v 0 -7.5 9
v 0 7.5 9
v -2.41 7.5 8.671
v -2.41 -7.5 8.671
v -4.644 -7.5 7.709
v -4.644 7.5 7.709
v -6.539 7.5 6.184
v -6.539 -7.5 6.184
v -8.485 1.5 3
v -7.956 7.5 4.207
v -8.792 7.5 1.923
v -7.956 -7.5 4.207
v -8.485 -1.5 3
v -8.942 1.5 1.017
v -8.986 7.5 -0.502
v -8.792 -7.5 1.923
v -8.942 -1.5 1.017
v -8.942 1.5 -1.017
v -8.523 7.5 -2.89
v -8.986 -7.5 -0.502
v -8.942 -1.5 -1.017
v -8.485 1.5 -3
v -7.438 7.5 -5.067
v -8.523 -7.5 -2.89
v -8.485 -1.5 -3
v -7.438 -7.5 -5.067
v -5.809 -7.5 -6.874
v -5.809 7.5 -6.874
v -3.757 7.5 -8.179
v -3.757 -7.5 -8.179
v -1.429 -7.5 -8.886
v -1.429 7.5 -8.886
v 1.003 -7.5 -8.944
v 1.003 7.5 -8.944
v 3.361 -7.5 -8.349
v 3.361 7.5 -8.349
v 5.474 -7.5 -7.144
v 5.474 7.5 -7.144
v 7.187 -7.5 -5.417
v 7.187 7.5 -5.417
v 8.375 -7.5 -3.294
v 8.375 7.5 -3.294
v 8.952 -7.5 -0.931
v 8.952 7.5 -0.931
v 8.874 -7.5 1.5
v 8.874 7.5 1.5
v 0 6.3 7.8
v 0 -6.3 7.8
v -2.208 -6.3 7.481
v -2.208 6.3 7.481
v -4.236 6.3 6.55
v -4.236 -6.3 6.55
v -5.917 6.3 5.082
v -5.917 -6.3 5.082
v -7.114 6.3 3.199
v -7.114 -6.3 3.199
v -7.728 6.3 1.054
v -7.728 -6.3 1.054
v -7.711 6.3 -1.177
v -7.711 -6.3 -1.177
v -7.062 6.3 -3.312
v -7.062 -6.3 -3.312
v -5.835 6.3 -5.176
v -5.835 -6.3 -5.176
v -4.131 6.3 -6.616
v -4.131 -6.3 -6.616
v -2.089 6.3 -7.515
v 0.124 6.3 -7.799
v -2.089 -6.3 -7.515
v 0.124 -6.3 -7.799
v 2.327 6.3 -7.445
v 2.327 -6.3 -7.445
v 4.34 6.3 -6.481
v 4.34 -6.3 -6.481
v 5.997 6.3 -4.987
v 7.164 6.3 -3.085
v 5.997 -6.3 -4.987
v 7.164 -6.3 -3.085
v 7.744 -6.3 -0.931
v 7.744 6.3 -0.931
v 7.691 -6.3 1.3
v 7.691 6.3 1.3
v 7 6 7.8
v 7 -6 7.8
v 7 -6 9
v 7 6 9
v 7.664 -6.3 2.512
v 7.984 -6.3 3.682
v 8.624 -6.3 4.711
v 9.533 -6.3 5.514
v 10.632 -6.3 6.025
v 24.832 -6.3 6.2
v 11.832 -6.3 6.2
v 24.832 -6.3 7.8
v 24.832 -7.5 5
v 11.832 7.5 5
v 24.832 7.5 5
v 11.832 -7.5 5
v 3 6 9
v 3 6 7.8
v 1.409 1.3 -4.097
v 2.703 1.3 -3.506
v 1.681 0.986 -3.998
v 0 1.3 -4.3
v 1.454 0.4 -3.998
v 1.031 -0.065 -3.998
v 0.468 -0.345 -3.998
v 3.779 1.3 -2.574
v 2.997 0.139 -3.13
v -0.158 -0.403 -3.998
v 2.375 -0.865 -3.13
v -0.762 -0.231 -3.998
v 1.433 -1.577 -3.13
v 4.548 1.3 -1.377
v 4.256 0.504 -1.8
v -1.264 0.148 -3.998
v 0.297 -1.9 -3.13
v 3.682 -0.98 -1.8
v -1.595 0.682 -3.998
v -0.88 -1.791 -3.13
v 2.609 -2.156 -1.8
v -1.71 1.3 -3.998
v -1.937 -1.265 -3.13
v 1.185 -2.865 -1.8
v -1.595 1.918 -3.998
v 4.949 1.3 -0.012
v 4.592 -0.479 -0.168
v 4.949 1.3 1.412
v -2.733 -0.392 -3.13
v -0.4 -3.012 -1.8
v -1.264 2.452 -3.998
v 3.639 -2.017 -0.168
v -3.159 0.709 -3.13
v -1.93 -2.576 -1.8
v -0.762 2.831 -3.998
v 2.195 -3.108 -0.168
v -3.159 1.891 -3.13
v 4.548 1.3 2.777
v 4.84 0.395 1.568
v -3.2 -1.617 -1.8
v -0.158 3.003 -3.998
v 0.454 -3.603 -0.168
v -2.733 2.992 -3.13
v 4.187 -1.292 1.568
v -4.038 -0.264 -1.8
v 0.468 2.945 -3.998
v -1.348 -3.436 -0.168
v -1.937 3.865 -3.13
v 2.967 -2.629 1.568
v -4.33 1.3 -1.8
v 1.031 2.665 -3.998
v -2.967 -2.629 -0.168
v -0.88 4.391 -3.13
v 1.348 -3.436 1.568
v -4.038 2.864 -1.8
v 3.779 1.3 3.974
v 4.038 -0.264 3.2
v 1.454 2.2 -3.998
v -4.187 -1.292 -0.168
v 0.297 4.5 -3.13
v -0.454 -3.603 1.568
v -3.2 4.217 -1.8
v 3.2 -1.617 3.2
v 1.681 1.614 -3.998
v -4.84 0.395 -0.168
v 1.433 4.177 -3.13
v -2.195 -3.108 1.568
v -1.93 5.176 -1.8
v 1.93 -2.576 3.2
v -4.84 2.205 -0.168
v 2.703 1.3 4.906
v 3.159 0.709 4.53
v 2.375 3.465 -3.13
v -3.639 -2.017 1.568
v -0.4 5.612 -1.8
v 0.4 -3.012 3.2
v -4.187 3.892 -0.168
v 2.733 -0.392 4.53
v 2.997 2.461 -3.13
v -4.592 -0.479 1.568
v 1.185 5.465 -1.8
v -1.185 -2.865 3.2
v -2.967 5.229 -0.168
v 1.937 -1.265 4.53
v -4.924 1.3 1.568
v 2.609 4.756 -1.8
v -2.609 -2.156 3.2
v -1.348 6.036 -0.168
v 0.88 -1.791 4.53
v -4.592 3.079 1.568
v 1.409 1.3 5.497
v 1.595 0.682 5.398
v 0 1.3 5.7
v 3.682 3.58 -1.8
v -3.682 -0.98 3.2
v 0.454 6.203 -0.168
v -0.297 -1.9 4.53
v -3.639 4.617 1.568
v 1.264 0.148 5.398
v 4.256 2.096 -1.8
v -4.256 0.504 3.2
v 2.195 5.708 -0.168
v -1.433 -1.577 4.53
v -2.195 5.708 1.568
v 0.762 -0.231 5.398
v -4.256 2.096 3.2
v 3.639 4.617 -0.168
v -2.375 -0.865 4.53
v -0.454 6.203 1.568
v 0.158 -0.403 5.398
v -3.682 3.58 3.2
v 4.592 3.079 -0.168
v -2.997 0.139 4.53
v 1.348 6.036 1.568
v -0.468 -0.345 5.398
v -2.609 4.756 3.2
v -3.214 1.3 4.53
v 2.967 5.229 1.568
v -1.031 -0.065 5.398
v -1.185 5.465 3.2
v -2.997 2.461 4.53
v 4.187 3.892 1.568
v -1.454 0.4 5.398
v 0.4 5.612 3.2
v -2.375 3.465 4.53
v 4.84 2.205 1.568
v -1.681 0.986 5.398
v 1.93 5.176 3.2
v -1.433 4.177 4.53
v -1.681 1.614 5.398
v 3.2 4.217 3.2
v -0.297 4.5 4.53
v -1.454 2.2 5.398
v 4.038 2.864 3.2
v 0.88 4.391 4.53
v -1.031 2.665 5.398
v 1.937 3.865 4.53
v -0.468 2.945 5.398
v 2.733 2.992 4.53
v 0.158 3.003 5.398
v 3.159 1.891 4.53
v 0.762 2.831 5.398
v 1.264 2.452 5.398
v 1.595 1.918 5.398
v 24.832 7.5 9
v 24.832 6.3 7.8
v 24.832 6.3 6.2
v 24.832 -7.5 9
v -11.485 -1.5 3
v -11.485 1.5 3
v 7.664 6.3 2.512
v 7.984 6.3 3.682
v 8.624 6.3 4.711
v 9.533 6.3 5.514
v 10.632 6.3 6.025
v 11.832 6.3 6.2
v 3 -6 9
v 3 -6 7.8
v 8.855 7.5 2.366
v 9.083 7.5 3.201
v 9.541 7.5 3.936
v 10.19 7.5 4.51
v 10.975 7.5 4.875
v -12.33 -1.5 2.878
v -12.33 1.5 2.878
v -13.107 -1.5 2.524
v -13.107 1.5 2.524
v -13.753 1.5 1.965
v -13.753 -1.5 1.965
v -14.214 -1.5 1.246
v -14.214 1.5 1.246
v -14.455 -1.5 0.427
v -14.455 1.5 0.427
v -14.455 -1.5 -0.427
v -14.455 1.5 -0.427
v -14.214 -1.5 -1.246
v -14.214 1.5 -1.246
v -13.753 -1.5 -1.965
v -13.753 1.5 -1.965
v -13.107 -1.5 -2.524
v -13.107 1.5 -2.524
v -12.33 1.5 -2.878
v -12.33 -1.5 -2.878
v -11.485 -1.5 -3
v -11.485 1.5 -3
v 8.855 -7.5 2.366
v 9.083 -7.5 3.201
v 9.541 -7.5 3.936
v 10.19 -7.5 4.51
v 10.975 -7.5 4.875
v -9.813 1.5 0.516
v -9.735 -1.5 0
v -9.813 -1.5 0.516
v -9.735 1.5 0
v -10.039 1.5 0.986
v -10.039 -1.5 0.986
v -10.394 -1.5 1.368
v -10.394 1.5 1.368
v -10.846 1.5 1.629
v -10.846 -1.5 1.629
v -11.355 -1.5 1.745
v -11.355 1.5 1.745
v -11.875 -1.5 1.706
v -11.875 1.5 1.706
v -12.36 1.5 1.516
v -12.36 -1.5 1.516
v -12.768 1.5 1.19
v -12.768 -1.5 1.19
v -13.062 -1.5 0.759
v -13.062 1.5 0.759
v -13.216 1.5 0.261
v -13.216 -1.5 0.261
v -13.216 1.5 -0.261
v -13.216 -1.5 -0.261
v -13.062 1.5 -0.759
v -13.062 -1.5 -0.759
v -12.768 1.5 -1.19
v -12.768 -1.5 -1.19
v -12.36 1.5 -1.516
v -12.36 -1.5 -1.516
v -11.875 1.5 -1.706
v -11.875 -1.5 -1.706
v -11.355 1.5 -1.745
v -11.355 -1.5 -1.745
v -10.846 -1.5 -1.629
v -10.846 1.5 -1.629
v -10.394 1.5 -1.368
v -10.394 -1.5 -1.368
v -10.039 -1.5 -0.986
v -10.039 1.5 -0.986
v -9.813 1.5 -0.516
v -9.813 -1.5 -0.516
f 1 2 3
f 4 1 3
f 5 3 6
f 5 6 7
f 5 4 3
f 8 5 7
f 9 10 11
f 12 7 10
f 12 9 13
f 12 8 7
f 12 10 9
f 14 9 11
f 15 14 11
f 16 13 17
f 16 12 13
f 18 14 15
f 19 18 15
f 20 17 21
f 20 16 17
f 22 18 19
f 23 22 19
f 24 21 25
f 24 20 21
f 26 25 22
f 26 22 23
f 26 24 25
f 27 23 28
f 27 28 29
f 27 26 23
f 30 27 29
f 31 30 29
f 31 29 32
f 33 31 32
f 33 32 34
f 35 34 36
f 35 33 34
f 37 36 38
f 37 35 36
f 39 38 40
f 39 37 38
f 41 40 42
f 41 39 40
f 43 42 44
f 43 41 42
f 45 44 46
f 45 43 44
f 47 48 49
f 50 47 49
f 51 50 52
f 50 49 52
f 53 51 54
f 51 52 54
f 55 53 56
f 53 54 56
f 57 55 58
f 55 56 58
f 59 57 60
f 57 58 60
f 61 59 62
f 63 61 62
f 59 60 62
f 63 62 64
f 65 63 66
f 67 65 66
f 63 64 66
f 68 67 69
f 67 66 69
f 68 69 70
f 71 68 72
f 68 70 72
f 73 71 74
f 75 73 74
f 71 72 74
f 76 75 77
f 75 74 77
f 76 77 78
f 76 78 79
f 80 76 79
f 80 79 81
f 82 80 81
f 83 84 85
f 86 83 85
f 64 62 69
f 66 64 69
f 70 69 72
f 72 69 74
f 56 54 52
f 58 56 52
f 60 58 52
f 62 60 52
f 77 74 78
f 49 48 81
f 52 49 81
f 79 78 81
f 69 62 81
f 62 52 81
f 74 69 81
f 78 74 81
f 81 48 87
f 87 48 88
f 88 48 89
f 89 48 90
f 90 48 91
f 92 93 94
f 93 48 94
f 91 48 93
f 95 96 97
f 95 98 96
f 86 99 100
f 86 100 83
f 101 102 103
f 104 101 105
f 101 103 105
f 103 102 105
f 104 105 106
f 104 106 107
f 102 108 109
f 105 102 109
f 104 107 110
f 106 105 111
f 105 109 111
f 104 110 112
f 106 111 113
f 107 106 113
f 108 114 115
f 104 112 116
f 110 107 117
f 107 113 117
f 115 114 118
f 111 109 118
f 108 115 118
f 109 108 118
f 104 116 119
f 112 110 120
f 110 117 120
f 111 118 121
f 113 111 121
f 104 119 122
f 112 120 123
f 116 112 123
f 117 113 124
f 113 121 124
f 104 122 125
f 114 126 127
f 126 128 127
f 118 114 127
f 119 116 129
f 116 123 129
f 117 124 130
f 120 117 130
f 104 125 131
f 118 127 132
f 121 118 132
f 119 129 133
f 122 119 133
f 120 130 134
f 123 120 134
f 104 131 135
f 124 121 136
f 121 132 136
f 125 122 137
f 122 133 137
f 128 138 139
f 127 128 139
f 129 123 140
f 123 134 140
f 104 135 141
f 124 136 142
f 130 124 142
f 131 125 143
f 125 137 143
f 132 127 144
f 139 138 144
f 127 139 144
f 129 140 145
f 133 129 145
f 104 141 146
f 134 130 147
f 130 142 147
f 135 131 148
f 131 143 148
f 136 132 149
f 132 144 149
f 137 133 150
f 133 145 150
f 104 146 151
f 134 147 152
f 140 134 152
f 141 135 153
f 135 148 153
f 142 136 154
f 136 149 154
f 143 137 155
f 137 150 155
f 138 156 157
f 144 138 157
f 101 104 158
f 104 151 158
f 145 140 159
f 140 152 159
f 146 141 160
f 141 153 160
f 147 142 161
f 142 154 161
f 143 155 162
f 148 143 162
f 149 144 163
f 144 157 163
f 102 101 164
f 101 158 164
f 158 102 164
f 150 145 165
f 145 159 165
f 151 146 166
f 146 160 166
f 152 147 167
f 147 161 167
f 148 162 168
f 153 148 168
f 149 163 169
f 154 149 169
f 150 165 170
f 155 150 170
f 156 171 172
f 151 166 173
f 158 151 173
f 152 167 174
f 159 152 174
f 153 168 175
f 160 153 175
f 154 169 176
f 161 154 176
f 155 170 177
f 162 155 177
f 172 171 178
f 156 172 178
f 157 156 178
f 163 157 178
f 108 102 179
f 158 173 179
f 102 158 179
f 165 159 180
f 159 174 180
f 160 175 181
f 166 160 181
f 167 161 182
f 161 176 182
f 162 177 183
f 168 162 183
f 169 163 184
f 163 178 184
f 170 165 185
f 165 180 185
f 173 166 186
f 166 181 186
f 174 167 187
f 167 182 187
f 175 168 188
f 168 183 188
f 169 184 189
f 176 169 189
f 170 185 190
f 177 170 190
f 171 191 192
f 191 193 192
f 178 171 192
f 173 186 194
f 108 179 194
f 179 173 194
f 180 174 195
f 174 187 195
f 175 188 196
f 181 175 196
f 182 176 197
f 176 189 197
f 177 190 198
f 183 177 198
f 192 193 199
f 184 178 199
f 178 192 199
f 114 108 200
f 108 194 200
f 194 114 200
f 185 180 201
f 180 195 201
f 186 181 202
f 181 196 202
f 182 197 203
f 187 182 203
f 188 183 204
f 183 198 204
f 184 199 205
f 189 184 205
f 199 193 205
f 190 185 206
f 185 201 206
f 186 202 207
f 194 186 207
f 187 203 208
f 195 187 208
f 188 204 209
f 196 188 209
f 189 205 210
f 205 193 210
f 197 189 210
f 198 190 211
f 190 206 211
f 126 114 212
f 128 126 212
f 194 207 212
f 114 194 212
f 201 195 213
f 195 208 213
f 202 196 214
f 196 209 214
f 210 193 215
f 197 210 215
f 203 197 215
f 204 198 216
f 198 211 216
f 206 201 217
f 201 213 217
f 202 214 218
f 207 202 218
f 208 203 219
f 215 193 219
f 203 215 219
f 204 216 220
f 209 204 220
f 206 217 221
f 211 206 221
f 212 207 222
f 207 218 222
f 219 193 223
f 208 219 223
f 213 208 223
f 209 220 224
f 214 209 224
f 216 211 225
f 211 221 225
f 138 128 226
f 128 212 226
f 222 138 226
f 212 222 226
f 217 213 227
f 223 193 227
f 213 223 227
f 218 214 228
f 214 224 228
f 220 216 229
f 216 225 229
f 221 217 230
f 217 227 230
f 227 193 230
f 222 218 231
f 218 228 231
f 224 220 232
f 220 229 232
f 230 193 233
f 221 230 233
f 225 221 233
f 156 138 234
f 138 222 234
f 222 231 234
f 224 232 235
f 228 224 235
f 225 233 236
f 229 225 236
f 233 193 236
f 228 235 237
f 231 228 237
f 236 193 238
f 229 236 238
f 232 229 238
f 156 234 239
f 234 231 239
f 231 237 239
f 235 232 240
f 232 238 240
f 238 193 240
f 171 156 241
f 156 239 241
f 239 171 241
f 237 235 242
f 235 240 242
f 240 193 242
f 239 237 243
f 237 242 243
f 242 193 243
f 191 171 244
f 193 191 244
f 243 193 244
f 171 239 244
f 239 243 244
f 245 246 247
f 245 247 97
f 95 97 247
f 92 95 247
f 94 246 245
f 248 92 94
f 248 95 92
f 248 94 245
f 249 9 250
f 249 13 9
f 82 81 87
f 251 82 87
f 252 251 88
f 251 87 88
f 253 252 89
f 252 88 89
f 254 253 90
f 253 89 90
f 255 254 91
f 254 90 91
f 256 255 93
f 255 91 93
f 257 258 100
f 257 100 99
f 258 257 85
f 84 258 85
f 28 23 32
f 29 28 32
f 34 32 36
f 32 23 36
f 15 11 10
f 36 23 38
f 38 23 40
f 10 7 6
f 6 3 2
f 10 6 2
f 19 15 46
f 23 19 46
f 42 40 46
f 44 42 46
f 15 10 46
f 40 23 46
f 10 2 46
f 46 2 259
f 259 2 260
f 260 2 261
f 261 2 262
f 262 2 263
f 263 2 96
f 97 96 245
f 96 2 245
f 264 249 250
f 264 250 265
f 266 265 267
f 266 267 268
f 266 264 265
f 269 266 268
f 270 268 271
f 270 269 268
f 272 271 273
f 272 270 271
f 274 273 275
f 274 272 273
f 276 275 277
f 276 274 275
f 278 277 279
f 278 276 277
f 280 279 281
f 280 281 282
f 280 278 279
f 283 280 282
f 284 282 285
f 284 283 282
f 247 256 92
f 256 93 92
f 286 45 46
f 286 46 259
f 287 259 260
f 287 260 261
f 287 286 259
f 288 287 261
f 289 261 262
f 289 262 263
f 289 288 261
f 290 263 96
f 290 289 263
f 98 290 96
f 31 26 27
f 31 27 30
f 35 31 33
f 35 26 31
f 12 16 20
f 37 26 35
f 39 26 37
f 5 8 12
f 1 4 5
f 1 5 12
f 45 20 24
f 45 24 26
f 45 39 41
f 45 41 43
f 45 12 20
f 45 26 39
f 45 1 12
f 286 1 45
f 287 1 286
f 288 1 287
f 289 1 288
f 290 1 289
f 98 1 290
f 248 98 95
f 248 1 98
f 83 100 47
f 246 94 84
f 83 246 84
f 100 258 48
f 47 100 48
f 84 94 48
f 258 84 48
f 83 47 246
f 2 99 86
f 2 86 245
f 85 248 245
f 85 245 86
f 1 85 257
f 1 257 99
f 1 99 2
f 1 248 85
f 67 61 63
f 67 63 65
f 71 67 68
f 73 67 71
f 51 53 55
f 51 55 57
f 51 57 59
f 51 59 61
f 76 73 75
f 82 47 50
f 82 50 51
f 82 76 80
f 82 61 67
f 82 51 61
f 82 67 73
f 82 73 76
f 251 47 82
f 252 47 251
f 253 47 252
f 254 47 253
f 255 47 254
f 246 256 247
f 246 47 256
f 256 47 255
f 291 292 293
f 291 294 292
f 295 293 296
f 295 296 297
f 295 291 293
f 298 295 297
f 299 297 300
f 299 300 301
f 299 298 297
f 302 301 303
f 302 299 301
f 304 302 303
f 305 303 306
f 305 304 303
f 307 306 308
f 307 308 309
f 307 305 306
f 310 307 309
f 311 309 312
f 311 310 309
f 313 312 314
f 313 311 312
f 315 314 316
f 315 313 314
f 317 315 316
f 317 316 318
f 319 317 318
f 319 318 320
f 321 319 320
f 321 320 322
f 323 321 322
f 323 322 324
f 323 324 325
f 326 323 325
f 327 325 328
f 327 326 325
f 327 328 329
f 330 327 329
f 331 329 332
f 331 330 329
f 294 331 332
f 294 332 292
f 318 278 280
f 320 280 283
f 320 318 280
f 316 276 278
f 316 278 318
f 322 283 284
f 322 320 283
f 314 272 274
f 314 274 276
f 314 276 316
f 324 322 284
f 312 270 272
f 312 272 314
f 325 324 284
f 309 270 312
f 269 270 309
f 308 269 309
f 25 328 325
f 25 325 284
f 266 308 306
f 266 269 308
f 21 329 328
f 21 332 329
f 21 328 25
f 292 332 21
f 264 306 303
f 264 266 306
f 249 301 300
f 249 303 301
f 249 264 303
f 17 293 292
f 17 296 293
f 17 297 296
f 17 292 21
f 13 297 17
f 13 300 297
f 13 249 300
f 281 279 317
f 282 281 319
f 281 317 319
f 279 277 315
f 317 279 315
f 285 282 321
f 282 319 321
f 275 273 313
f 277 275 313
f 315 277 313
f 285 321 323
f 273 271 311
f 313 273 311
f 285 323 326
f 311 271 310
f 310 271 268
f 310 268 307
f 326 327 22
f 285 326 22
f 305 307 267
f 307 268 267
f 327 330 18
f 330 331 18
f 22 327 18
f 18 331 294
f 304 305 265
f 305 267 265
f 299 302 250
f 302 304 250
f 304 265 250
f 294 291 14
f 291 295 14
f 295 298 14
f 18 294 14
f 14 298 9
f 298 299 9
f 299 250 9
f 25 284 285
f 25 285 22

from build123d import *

# Parameters (mm, degrees)
F1_DEPTH = 7.5
F2_T     = -1.2
F3_W     = 4
F3_H     = 1.2
F4_DEPTH = 6
F5_R     = 1.75
F6_DEPTH = 1.5


with BuildPart() as f1:
    # F0 (on Front) → F1 (new body, symmetric)
    with BuildSketch(Plane.XZ):
        with BuildLine():
            Line((24.83216, 9), (0, 9))
            ThreePointArc((0, 9), (-5.809475, -6.873864), (8.87412, 1.5))
            ThreePointArc((8.87412, 1.5), (9.540872, 3.936492), (11.83216, 5))
            Line((11.83216, 5), (24.83216, 5))
            Line((24.83216, 5), (24.83216, 9))
        make_face()
    extrude(amount=F1_DEPTH, both=True)

    # F2
    f2_openings = [f1.faces().sort_by_distance(p)[0] for p in [
        (24.83216, 0, 7),
    ]]
    offset(amount=F2_T, openings=f2_openings)

    # F3 (on Front) → F4 (cut, symmetric)
    with BuildSketch(Plane.XZ):
        with Locations((5, 8.4)):
            Rectangle(F3_W, F3_H)
    extrude(amount=F4_DEPTH, both=True, mode=Mode.SUBTRACT)

    # F5 (on Front) → F6 (join, symmetric)
    with BuildSketch(Plane.XZ):
        with BuildLine():
            Line((-8.485281, 3), (-11.485281, 3))
            ThreePointArc((-11.485281, 3), (-14.485281, 0), (-11.485281, -3))
            Line((-11.485281, -3), (-8.485281, -3))
            Line((-8.485281, -3), (-8.485281, 3))
        make_face()
        with Locations((-11.485281, 0)):
            Circle(F5_R, mode=Mode.SUBTRACT)
    extrude(amount=F6_DEPTH, both=True)


with BuildPart() as f8:
    # F7 (on Front) → F8 (revolve)
    with BuildSketch(Plane.XZ):
        with BuildLine():
            Line((0, 2.2), (0, -7.8))
            ThreePointArc((0, -7.8), (5, -2.8), (0, 2.2))
        make_face()
    revolve(axis=Axis((0, 0, -2.8), (0, 0, -1)))


with BuildPart() as f8_1:
    # F9: moved
    add(f8.part.moved(Location((0, 1.3, 3.5))))


solid = Compound([f1.part, f8_1.part])
